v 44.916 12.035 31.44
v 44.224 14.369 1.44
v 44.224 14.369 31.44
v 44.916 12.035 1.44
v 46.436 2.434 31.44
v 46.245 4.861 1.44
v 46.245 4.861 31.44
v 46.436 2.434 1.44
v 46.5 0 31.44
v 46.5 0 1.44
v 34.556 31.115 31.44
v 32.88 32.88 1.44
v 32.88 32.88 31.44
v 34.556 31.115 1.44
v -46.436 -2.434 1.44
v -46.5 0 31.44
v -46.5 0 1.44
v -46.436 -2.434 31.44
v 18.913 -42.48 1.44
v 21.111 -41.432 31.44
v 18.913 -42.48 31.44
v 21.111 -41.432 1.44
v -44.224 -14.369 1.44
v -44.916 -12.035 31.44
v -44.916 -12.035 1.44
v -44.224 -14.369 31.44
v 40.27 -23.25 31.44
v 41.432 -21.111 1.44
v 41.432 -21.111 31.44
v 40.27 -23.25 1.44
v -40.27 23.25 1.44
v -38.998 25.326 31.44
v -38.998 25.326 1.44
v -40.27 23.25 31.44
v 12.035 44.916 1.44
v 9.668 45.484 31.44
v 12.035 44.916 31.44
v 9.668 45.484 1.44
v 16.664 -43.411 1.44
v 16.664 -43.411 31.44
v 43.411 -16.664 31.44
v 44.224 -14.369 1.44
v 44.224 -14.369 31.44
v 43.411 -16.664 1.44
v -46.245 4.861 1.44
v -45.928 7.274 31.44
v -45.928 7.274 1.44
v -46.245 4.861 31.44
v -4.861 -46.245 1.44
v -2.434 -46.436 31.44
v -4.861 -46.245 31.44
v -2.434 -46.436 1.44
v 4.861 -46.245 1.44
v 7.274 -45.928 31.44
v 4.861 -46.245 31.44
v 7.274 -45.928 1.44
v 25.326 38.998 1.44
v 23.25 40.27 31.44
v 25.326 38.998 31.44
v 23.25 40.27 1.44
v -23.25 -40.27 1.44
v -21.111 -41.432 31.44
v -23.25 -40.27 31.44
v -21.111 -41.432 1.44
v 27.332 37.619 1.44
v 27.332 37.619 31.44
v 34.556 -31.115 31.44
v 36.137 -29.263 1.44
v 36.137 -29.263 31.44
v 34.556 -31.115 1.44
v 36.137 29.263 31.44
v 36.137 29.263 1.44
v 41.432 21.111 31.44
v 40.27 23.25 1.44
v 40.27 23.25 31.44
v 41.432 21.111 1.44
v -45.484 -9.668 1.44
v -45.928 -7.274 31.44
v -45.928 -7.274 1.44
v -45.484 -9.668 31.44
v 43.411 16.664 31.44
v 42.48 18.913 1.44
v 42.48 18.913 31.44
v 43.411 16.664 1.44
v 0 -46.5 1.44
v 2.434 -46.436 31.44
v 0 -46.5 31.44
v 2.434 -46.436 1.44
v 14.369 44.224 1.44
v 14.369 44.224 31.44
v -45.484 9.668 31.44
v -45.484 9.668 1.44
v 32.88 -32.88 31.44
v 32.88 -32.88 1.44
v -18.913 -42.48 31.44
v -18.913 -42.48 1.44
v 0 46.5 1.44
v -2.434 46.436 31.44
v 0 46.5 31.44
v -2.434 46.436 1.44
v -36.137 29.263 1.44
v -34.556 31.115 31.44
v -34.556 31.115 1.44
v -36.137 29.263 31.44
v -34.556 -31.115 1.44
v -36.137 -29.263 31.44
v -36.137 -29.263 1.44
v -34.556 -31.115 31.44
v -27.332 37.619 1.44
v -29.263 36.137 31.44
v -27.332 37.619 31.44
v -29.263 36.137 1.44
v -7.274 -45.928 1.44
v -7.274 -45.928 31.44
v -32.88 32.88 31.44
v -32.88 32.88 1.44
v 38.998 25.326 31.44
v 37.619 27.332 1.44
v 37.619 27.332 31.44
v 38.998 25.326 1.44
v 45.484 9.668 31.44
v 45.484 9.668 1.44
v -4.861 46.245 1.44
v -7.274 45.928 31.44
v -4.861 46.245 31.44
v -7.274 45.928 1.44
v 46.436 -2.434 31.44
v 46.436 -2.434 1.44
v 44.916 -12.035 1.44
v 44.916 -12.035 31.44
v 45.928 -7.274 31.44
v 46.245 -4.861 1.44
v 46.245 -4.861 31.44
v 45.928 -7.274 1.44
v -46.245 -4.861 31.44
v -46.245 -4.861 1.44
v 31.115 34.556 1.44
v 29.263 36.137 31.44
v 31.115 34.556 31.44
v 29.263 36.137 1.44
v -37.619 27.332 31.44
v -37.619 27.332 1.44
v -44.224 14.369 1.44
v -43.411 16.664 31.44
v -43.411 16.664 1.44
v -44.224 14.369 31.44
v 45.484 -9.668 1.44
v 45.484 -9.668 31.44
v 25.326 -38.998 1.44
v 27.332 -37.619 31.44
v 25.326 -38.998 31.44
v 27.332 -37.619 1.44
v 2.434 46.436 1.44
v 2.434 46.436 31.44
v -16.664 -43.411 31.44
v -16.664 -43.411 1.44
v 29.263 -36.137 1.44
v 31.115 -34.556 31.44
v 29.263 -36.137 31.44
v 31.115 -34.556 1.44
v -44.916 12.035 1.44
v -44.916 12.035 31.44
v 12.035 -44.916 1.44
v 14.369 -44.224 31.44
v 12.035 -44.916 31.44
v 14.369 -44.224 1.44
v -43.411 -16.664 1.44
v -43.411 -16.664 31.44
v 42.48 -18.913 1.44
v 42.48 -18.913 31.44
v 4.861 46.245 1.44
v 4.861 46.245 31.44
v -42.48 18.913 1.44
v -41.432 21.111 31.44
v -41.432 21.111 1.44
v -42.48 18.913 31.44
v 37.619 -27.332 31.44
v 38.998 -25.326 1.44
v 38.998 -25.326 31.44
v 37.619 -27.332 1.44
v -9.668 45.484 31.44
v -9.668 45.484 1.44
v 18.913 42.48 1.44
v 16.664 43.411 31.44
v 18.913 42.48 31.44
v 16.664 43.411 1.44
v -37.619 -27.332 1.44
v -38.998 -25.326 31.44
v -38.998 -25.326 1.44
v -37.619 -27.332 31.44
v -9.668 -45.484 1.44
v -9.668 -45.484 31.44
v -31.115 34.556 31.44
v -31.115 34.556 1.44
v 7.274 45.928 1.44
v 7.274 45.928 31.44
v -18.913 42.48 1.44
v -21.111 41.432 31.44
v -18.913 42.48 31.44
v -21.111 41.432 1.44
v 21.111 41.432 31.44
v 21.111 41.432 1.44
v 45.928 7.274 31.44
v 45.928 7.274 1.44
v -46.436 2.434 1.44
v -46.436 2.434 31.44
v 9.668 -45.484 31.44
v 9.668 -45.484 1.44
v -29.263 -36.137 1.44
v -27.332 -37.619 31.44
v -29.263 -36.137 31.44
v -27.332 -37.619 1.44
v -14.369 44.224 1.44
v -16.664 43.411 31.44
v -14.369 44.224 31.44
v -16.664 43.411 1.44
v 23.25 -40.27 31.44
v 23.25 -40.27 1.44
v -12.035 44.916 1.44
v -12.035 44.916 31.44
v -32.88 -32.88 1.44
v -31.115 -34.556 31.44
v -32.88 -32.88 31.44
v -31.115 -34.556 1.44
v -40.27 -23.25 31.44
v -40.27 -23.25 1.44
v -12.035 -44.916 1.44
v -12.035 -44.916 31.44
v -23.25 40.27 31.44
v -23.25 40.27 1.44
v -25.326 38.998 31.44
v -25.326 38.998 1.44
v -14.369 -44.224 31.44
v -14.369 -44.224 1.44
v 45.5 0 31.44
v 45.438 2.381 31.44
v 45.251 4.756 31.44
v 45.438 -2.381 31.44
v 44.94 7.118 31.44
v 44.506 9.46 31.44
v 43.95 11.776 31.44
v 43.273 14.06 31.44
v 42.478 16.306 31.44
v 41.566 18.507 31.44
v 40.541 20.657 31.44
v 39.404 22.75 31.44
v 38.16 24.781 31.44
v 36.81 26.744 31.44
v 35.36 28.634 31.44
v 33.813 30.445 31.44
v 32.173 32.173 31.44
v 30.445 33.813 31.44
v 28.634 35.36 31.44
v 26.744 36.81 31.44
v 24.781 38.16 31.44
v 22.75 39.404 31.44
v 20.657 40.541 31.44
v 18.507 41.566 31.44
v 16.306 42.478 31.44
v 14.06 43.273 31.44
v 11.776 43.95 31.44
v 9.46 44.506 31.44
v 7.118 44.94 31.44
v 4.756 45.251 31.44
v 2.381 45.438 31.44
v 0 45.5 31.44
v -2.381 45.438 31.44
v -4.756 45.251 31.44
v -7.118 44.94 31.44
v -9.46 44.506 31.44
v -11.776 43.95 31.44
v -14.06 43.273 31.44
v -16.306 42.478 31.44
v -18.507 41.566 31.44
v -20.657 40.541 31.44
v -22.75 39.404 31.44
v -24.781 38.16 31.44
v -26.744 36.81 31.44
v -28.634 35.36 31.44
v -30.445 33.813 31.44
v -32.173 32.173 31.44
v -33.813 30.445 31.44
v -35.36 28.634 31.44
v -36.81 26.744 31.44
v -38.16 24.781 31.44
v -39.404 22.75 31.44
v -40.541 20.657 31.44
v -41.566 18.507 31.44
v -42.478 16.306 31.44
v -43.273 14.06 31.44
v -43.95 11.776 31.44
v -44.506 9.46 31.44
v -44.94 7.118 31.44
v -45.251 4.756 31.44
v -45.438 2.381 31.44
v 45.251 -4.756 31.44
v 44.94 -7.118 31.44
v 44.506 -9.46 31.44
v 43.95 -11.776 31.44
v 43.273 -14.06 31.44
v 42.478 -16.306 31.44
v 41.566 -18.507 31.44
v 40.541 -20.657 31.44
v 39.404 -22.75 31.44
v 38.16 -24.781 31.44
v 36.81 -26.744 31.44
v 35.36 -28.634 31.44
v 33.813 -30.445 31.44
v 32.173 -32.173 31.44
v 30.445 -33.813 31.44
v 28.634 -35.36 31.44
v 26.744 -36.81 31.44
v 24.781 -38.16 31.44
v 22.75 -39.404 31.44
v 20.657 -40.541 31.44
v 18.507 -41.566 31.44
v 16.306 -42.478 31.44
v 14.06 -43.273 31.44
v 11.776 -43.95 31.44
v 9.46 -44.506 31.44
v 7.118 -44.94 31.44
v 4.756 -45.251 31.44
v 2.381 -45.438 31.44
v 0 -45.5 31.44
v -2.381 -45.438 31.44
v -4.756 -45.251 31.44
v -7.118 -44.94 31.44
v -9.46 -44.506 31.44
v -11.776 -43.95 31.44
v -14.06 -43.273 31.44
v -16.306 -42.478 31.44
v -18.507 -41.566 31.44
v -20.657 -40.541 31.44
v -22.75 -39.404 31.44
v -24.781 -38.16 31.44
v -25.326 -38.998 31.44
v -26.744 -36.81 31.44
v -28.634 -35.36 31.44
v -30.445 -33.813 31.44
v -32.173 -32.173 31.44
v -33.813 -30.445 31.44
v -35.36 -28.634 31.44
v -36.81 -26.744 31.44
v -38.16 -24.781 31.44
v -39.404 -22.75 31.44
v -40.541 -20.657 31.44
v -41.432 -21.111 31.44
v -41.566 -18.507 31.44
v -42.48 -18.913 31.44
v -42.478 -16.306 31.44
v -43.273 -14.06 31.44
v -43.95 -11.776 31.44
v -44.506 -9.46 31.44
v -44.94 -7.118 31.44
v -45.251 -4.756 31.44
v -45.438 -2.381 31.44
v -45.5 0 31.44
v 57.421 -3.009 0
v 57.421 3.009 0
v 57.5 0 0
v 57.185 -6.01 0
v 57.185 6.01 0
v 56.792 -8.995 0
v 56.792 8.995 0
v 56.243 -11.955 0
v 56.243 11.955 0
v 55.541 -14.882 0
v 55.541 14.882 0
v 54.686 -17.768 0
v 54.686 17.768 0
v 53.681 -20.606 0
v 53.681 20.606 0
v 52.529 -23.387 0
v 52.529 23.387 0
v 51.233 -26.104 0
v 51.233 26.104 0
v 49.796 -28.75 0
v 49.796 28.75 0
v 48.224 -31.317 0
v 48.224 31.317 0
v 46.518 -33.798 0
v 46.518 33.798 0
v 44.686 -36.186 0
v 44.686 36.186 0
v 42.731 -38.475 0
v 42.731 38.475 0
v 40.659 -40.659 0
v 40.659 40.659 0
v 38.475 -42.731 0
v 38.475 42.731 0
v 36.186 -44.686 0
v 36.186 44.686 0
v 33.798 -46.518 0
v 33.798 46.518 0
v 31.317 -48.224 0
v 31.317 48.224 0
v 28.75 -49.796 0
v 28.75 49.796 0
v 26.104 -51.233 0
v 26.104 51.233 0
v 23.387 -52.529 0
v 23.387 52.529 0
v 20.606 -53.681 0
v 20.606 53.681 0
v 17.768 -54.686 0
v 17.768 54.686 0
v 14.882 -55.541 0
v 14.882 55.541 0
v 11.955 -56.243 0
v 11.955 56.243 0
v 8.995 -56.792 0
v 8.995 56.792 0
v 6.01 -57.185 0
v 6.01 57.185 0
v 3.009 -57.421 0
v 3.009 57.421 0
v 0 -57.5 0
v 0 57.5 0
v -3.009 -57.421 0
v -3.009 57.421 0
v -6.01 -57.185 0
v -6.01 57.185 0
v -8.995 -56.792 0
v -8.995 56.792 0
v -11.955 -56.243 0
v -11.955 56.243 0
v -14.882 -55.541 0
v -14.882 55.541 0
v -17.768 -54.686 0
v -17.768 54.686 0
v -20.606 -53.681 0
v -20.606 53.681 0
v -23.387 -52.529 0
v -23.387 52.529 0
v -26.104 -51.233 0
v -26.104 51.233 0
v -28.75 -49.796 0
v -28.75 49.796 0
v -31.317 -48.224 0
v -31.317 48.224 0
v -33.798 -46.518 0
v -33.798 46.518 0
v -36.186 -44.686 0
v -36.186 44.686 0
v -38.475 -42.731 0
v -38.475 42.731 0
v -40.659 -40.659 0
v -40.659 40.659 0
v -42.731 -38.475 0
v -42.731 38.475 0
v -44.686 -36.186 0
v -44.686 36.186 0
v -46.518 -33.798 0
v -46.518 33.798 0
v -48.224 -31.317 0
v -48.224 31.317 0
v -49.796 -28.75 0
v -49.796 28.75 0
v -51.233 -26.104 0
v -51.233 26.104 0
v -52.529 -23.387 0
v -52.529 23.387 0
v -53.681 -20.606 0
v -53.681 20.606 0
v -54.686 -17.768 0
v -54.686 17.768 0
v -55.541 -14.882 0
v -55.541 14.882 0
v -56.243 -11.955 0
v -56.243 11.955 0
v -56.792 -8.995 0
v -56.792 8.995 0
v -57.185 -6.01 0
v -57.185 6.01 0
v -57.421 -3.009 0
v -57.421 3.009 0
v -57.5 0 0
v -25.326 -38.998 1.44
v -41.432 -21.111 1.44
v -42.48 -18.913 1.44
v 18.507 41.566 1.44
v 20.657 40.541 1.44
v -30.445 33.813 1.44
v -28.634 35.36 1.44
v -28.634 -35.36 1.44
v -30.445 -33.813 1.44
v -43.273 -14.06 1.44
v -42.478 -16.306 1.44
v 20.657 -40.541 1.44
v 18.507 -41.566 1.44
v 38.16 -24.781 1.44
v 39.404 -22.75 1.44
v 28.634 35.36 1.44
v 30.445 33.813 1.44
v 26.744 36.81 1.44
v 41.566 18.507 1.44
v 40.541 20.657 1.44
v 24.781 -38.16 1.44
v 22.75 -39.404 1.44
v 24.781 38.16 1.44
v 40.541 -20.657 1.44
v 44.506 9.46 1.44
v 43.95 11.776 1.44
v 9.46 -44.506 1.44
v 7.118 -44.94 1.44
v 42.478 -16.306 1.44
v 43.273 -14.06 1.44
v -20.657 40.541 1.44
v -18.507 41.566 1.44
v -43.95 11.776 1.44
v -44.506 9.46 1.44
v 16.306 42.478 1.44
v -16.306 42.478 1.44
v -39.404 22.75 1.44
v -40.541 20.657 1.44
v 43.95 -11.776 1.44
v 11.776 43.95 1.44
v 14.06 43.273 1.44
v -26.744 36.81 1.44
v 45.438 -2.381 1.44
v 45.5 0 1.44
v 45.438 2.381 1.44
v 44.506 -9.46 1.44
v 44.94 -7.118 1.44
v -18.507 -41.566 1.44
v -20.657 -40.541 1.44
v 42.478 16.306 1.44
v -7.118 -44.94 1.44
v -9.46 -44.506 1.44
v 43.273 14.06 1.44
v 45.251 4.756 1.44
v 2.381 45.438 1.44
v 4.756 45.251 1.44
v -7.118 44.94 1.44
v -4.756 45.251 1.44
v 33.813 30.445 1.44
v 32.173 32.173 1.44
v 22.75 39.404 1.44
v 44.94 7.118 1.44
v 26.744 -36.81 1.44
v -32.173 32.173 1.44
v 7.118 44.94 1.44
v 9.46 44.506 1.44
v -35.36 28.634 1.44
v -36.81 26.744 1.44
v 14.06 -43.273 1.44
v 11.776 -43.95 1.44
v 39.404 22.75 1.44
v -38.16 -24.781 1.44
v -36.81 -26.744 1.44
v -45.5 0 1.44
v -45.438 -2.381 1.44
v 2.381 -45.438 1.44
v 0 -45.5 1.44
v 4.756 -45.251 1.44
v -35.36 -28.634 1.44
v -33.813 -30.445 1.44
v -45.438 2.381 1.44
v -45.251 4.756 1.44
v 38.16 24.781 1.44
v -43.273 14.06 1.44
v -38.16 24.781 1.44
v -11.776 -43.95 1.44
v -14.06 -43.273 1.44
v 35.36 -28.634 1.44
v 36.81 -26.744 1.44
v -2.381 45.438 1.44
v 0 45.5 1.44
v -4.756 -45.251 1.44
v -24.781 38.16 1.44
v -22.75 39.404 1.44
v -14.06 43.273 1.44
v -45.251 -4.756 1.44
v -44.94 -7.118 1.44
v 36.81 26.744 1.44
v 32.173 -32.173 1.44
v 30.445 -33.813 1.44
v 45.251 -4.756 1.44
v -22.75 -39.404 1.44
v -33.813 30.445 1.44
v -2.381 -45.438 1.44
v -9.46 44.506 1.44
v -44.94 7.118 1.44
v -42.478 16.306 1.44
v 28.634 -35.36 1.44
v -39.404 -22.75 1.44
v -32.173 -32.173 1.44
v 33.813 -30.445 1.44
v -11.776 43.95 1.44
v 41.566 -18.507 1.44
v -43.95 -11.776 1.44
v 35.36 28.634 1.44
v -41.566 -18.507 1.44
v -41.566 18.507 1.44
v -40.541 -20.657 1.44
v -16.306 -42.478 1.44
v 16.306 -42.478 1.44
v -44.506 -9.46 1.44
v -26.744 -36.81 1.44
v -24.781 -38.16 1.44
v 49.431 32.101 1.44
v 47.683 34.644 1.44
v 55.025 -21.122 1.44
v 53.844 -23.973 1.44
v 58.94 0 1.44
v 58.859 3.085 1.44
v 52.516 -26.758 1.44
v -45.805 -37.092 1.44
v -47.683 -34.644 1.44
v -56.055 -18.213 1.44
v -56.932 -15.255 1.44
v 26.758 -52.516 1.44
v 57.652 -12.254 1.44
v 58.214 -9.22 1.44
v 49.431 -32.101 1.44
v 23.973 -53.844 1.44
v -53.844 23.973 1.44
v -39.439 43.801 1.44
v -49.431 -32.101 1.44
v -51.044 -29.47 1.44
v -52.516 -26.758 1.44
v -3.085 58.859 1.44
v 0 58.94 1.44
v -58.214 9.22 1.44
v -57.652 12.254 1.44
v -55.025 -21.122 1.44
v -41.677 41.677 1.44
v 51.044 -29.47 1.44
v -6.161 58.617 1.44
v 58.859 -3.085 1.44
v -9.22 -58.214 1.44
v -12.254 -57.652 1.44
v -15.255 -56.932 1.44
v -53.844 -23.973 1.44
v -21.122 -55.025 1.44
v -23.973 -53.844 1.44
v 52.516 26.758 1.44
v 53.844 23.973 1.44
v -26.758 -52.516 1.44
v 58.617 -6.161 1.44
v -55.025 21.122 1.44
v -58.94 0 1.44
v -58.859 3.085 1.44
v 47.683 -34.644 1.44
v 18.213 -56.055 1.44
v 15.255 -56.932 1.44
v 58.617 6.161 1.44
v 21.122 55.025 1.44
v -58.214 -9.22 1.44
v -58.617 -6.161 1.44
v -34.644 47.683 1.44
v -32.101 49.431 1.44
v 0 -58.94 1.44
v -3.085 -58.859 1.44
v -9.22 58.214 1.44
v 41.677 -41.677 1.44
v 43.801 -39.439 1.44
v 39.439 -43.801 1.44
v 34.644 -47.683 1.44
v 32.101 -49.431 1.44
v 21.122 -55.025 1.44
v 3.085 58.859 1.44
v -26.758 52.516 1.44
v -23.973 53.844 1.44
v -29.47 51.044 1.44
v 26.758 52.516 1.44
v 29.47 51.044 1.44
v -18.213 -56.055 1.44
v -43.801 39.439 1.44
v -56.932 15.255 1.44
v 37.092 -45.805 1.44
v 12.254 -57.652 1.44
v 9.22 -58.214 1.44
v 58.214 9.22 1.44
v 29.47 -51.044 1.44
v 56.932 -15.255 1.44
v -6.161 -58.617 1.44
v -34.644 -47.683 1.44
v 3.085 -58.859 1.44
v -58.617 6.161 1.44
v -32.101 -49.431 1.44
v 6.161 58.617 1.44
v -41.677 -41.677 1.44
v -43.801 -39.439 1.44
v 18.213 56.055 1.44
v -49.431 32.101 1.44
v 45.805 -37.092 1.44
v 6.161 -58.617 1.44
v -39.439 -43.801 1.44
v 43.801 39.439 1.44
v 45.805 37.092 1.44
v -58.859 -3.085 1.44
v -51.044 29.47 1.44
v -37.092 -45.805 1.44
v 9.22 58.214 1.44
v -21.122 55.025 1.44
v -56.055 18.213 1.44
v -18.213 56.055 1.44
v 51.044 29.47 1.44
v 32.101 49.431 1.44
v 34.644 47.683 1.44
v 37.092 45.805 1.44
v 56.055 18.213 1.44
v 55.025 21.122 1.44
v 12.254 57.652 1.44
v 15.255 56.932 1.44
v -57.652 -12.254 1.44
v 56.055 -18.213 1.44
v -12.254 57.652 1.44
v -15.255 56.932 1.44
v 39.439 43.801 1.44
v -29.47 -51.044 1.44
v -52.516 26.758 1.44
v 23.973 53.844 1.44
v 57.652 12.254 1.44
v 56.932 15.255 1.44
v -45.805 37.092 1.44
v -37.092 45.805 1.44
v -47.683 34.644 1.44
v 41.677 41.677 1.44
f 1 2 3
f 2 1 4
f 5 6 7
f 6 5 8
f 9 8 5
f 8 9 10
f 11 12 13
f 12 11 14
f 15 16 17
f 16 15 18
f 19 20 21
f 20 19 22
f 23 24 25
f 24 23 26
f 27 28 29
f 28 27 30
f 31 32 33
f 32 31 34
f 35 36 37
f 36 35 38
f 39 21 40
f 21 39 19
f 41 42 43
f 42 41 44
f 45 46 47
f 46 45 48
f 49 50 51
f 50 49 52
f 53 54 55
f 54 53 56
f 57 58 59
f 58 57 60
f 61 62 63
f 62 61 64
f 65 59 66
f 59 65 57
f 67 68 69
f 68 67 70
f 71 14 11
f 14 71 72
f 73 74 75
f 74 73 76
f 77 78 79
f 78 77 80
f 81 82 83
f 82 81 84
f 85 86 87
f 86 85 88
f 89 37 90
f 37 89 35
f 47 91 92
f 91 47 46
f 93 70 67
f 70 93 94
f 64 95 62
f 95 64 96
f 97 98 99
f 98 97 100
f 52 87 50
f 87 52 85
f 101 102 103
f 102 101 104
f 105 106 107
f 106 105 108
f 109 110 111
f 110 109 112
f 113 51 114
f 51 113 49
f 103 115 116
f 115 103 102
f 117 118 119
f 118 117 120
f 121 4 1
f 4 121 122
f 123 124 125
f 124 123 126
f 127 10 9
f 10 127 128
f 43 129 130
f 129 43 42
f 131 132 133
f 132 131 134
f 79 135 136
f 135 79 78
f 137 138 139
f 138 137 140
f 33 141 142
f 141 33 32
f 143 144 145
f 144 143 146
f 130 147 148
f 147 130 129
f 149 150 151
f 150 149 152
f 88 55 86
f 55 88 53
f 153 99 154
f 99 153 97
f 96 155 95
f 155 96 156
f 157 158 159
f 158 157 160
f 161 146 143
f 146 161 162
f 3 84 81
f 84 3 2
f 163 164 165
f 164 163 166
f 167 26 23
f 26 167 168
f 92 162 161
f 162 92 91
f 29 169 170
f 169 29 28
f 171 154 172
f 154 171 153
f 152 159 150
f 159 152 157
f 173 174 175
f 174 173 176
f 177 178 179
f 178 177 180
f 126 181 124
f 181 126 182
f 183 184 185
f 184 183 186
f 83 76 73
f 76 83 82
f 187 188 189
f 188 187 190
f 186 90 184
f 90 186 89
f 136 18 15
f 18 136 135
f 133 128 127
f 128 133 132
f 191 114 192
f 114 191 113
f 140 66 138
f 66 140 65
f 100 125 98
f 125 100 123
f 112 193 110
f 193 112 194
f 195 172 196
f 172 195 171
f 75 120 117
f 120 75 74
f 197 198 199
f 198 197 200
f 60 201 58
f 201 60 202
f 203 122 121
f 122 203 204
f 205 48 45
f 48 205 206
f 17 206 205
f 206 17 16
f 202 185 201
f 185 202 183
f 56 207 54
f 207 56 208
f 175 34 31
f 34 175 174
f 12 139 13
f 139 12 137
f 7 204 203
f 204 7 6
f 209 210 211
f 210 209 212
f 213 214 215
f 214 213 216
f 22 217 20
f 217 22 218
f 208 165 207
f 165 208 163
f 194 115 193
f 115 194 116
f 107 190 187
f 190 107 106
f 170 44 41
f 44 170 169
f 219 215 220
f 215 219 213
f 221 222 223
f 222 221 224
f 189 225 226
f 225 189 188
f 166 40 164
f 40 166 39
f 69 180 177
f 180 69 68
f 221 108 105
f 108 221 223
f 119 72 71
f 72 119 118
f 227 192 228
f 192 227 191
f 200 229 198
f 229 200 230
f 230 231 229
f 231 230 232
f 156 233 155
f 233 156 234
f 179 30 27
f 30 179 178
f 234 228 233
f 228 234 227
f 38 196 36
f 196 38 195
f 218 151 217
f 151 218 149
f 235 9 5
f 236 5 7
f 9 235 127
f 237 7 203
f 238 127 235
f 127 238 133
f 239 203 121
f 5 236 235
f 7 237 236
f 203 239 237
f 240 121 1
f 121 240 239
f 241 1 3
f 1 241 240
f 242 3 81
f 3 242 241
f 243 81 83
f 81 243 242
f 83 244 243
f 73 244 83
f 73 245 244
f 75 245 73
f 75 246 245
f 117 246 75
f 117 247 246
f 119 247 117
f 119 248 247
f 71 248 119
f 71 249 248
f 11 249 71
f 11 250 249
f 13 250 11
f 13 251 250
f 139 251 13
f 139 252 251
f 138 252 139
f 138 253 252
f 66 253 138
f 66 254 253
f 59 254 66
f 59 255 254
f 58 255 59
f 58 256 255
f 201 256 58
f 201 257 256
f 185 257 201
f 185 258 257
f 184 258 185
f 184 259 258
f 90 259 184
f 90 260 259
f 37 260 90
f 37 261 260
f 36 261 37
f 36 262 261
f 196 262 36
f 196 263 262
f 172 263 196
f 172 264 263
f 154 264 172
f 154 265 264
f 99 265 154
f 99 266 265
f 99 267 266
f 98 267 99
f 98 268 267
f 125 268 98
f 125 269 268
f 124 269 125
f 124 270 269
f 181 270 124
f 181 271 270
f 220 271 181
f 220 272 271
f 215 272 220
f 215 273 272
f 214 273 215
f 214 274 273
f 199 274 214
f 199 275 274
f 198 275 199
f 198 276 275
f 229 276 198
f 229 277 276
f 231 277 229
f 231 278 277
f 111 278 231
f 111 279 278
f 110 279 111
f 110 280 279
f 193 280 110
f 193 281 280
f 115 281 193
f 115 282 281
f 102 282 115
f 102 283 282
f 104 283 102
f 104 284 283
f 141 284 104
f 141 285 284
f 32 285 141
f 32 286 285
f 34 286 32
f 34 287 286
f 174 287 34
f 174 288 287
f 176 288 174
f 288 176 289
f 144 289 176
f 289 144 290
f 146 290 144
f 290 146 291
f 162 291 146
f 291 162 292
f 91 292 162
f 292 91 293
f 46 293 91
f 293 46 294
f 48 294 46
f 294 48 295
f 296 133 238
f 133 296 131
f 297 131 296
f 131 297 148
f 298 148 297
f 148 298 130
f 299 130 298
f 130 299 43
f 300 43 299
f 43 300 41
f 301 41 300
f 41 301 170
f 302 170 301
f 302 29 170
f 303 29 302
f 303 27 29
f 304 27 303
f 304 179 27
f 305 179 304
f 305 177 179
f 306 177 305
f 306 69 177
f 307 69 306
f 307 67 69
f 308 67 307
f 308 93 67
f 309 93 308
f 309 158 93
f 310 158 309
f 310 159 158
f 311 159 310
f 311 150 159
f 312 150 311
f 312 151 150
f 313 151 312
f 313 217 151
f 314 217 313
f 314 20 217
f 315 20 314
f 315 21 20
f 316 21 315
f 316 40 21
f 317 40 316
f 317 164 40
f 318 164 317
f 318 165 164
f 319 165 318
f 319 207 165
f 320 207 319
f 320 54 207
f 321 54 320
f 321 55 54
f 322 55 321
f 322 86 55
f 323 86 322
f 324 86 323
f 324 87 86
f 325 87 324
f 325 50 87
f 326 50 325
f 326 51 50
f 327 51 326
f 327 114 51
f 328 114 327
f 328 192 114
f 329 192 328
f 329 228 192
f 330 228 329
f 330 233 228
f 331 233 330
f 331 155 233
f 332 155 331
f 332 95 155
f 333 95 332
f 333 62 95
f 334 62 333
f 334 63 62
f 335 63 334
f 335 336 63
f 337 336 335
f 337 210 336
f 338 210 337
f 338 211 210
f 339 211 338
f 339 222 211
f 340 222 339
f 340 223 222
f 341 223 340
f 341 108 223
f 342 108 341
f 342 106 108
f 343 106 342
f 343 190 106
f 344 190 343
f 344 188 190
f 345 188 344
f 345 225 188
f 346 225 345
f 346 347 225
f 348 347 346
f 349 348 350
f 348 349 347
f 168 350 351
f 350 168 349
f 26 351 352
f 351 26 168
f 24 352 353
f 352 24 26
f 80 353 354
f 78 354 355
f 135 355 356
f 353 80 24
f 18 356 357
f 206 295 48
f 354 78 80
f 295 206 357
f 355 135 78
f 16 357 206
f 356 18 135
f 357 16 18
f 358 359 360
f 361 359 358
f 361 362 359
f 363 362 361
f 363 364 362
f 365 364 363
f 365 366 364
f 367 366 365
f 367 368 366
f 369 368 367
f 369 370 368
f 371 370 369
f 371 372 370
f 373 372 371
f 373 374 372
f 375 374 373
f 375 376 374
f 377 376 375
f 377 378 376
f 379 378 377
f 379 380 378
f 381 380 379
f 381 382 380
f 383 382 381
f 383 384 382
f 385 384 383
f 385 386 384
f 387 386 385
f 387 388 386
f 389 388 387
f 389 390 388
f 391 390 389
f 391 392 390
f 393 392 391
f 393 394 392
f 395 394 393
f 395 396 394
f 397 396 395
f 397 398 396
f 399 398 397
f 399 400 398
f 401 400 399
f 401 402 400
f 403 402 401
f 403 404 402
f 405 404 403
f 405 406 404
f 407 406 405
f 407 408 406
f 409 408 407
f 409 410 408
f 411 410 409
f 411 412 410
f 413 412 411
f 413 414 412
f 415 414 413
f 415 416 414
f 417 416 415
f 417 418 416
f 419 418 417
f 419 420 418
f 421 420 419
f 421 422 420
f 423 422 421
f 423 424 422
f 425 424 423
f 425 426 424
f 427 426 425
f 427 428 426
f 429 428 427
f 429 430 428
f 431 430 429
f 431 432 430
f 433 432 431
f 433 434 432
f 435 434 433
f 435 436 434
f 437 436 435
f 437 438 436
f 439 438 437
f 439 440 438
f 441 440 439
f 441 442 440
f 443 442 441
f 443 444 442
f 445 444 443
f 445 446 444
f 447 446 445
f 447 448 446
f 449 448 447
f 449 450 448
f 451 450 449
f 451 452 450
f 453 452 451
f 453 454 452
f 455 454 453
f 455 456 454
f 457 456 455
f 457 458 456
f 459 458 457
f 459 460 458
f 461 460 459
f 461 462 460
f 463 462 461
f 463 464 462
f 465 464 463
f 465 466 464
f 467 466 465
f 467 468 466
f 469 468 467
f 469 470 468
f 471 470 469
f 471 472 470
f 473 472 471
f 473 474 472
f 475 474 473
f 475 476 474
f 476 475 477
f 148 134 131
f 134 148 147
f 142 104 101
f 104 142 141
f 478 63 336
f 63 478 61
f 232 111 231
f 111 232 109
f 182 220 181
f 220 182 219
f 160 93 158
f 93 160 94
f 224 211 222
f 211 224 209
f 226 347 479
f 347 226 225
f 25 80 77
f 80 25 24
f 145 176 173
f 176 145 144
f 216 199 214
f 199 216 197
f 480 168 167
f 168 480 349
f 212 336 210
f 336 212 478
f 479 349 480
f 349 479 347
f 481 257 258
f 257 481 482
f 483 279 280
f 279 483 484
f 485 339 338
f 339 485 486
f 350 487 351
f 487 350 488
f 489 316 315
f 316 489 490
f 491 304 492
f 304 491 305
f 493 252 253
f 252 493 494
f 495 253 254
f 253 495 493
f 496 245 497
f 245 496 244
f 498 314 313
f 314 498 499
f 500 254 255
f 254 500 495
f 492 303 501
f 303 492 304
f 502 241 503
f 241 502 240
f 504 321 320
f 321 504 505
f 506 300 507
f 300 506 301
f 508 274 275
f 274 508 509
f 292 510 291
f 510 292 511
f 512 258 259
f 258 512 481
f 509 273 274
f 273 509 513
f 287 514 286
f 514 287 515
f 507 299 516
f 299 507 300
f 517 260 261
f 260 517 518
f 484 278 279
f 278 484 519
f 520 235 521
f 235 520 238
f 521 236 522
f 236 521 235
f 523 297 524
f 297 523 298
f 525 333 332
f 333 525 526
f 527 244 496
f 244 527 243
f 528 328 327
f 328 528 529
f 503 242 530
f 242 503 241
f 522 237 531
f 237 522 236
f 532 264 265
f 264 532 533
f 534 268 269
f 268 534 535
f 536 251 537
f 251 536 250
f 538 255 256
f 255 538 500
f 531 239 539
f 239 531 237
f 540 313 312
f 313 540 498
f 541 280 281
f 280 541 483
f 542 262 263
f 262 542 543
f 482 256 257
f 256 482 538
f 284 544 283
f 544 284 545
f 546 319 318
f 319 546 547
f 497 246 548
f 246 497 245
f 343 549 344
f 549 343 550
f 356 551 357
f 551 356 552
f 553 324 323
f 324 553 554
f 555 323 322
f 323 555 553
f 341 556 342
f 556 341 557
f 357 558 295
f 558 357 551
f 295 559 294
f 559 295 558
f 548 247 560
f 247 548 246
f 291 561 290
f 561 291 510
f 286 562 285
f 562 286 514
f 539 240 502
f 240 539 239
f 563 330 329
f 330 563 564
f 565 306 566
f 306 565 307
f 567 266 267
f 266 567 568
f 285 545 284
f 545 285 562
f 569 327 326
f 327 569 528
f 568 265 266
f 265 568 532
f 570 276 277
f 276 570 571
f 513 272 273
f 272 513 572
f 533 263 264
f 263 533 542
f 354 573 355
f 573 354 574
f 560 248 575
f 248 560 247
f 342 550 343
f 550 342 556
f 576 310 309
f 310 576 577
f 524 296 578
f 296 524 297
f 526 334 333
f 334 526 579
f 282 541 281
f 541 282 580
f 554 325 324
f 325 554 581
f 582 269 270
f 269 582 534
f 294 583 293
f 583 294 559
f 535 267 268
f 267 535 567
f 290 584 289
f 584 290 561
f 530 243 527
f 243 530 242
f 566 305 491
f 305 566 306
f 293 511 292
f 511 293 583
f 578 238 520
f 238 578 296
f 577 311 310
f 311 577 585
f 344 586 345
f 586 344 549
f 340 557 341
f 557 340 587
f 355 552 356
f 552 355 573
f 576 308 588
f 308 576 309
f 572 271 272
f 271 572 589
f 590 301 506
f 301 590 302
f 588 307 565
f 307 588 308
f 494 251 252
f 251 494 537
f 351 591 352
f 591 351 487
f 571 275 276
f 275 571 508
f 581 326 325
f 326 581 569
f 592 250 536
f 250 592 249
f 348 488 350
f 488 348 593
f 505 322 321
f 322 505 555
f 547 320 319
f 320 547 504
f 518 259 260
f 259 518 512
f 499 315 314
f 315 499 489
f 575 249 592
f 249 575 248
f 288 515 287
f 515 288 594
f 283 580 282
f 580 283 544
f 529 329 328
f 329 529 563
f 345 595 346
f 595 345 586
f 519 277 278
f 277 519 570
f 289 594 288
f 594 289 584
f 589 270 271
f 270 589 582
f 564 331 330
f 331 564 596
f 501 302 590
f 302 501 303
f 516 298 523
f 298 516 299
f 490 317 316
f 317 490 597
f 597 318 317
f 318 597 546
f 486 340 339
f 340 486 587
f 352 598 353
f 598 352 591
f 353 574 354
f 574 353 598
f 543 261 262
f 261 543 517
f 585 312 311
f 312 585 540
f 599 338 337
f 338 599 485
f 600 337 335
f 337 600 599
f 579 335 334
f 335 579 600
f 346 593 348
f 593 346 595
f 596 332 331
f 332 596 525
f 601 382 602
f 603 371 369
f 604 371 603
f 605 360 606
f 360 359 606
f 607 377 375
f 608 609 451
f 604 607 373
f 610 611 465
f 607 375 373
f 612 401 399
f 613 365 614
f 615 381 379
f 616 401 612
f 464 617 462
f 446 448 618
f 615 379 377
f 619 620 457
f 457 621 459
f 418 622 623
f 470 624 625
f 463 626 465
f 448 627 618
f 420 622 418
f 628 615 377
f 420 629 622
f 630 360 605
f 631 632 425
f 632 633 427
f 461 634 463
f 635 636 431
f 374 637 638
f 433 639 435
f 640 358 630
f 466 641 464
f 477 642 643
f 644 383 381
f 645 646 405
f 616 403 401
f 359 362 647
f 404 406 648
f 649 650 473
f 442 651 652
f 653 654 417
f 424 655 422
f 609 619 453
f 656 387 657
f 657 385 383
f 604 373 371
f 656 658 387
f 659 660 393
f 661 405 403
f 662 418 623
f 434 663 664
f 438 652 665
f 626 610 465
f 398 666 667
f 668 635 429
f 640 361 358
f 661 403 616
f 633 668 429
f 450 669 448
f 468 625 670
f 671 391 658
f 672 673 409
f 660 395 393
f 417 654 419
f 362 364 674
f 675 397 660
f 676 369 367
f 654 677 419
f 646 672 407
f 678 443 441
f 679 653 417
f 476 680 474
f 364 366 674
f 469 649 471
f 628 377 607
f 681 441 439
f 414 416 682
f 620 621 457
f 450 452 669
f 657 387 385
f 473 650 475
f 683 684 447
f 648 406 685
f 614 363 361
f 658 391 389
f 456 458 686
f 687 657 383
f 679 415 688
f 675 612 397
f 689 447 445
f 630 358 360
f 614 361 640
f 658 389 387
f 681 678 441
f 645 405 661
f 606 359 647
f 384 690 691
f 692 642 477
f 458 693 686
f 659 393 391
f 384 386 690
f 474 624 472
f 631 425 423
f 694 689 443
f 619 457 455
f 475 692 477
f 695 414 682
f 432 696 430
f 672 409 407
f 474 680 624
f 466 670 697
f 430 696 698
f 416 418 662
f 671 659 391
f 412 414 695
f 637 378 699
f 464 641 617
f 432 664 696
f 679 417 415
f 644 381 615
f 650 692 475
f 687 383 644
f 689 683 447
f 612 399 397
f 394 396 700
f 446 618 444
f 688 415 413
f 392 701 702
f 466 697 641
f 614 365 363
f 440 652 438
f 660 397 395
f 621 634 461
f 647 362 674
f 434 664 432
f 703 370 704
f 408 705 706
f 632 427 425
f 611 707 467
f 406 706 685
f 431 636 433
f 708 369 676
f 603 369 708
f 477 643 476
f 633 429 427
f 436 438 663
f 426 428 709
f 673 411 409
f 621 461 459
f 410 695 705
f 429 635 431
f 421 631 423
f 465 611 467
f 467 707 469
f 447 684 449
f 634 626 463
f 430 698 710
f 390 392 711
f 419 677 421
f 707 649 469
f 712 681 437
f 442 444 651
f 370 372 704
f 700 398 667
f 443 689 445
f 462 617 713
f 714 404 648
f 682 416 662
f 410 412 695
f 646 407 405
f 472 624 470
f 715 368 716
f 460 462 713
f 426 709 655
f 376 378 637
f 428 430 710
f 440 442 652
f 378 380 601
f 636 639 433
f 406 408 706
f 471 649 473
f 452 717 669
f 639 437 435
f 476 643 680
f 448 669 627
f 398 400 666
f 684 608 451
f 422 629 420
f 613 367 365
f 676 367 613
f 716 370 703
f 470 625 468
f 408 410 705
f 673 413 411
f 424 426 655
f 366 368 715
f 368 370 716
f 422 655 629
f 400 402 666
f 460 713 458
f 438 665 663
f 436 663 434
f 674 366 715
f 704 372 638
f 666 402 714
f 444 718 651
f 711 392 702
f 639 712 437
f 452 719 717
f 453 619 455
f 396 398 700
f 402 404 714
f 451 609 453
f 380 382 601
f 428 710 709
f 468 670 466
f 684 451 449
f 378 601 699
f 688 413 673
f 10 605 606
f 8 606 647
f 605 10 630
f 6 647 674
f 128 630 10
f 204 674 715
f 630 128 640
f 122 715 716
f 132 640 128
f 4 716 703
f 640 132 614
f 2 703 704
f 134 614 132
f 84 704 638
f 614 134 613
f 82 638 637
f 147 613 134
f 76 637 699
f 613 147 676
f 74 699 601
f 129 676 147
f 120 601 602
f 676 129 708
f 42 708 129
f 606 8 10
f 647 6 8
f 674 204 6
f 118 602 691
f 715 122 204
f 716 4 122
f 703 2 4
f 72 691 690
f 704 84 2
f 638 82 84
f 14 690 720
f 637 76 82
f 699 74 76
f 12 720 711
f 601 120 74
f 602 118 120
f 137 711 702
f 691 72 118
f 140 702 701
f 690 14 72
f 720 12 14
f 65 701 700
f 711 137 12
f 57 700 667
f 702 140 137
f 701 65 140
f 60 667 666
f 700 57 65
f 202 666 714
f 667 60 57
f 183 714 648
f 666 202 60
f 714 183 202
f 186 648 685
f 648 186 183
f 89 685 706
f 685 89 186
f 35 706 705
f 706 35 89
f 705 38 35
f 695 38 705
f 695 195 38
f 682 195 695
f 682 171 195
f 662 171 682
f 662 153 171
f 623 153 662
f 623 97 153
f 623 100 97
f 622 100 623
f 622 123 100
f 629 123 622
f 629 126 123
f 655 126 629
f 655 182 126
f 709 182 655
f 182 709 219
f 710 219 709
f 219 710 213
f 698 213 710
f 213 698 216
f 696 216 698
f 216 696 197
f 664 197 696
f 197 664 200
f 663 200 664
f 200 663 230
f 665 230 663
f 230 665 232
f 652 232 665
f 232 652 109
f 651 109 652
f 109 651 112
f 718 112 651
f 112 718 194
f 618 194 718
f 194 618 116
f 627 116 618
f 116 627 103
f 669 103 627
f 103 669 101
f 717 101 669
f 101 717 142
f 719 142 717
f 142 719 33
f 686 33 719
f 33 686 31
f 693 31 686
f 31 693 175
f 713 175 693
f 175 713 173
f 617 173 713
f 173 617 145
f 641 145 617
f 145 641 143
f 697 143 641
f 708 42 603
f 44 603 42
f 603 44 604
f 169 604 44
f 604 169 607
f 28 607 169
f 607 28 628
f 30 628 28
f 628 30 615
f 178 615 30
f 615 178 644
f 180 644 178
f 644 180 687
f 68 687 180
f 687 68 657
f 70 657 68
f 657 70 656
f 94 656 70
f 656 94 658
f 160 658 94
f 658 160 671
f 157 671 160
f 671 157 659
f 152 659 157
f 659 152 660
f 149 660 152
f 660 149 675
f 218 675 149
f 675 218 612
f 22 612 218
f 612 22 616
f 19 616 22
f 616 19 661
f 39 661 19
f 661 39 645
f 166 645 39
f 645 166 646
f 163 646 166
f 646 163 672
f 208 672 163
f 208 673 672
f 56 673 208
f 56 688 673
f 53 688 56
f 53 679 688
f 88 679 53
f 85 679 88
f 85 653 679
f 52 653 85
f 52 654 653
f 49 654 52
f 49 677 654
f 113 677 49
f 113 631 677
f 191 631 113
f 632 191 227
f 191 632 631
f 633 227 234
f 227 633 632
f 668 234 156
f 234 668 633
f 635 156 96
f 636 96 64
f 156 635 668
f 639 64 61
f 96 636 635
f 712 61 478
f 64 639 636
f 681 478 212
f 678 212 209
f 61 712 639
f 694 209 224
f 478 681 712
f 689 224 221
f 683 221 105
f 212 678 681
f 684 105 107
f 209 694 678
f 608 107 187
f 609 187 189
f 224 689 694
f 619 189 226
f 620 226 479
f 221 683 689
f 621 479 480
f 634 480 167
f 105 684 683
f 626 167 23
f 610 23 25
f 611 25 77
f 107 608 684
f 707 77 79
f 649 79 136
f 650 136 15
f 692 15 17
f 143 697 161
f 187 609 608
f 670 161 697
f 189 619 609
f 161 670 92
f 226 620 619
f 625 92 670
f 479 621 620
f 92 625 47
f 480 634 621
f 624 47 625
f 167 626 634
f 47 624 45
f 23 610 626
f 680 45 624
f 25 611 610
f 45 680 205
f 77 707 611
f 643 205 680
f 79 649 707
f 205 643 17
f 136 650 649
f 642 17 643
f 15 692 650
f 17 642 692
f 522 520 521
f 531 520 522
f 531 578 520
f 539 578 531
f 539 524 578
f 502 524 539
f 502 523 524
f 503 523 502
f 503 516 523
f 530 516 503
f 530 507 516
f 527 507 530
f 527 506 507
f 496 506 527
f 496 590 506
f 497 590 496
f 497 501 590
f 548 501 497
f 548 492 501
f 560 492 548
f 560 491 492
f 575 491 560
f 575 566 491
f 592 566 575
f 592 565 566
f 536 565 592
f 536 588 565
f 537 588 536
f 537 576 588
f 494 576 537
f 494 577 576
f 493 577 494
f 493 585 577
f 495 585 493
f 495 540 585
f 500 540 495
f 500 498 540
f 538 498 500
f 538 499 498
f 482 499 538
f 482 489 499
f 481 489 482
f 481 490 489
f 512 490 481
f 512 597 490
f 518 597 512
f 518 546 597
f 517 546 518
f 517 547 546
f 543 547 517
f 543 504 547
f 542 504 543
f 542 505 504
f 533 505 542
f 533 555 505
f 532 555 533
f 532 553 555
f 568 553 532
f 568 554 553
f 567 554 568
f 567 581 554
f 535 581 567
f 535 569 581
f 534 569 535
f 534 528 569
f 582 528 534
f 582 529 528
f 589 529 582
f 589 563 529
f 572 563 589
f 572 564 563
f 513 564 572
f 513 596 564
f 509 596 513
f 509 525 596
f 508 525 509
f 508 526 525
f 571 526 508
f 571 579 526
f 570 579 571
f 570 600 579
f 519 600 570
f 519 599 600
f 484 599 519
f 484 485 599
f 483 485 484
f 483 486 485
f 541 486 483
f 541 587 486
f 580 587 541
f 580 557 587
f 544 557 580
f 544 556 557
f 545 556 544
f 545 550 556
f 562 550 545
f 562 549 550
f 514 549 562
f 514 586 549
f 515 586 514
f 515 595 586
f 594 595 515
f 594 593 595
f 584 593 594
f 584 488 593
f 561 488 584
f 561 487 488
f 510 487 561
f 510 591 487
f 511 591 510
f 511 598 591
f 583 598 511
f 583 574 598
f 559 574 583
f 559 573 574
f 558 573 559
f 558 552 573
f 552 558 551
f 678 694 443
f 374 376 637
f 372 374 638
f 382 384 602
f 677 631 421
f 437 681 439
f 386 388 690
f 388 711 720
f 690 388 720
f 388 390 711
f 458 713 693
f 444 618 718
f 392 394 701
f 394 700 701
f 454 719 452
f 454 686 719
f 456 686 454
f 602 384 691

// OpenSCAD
// Lüftungsdeckel

DeckelDicke = 6*0.24;
DeckelDurchmesser = 115;
LochDurchmesser = 93; 
ZapferlDicke = 1.2;
ZapferlBreite = 10;
ZapferlHoehe = 30;

$fn = 120;

cylinder(d1 = DeckelDurchmesser, d2 = DeckelDurchmesser+2*DeckelDicke, h = DeckelDicke); //45° Chamfer
difference()
{
    cylinder(d = LochDurchmesser, h = ZapferlHoehe+DeckelDicke);
    cylinder(d = LochDurchmesser-2, h = ZapferlHoehe+DeckelDicke+1);
}


module zapferl(rot = 0)
{
    rotate([0,0,rot]) 
        translate([LochDurchmesser/2-ZapferlDicke/2,0,0])
            translate([-ZapferlDicke/2,-ZapferlBreite/2,0]) 
                cube([ZapferlDicke,ZapferlBreite,ZapferlHoehe+DeckelDicke]);
}
